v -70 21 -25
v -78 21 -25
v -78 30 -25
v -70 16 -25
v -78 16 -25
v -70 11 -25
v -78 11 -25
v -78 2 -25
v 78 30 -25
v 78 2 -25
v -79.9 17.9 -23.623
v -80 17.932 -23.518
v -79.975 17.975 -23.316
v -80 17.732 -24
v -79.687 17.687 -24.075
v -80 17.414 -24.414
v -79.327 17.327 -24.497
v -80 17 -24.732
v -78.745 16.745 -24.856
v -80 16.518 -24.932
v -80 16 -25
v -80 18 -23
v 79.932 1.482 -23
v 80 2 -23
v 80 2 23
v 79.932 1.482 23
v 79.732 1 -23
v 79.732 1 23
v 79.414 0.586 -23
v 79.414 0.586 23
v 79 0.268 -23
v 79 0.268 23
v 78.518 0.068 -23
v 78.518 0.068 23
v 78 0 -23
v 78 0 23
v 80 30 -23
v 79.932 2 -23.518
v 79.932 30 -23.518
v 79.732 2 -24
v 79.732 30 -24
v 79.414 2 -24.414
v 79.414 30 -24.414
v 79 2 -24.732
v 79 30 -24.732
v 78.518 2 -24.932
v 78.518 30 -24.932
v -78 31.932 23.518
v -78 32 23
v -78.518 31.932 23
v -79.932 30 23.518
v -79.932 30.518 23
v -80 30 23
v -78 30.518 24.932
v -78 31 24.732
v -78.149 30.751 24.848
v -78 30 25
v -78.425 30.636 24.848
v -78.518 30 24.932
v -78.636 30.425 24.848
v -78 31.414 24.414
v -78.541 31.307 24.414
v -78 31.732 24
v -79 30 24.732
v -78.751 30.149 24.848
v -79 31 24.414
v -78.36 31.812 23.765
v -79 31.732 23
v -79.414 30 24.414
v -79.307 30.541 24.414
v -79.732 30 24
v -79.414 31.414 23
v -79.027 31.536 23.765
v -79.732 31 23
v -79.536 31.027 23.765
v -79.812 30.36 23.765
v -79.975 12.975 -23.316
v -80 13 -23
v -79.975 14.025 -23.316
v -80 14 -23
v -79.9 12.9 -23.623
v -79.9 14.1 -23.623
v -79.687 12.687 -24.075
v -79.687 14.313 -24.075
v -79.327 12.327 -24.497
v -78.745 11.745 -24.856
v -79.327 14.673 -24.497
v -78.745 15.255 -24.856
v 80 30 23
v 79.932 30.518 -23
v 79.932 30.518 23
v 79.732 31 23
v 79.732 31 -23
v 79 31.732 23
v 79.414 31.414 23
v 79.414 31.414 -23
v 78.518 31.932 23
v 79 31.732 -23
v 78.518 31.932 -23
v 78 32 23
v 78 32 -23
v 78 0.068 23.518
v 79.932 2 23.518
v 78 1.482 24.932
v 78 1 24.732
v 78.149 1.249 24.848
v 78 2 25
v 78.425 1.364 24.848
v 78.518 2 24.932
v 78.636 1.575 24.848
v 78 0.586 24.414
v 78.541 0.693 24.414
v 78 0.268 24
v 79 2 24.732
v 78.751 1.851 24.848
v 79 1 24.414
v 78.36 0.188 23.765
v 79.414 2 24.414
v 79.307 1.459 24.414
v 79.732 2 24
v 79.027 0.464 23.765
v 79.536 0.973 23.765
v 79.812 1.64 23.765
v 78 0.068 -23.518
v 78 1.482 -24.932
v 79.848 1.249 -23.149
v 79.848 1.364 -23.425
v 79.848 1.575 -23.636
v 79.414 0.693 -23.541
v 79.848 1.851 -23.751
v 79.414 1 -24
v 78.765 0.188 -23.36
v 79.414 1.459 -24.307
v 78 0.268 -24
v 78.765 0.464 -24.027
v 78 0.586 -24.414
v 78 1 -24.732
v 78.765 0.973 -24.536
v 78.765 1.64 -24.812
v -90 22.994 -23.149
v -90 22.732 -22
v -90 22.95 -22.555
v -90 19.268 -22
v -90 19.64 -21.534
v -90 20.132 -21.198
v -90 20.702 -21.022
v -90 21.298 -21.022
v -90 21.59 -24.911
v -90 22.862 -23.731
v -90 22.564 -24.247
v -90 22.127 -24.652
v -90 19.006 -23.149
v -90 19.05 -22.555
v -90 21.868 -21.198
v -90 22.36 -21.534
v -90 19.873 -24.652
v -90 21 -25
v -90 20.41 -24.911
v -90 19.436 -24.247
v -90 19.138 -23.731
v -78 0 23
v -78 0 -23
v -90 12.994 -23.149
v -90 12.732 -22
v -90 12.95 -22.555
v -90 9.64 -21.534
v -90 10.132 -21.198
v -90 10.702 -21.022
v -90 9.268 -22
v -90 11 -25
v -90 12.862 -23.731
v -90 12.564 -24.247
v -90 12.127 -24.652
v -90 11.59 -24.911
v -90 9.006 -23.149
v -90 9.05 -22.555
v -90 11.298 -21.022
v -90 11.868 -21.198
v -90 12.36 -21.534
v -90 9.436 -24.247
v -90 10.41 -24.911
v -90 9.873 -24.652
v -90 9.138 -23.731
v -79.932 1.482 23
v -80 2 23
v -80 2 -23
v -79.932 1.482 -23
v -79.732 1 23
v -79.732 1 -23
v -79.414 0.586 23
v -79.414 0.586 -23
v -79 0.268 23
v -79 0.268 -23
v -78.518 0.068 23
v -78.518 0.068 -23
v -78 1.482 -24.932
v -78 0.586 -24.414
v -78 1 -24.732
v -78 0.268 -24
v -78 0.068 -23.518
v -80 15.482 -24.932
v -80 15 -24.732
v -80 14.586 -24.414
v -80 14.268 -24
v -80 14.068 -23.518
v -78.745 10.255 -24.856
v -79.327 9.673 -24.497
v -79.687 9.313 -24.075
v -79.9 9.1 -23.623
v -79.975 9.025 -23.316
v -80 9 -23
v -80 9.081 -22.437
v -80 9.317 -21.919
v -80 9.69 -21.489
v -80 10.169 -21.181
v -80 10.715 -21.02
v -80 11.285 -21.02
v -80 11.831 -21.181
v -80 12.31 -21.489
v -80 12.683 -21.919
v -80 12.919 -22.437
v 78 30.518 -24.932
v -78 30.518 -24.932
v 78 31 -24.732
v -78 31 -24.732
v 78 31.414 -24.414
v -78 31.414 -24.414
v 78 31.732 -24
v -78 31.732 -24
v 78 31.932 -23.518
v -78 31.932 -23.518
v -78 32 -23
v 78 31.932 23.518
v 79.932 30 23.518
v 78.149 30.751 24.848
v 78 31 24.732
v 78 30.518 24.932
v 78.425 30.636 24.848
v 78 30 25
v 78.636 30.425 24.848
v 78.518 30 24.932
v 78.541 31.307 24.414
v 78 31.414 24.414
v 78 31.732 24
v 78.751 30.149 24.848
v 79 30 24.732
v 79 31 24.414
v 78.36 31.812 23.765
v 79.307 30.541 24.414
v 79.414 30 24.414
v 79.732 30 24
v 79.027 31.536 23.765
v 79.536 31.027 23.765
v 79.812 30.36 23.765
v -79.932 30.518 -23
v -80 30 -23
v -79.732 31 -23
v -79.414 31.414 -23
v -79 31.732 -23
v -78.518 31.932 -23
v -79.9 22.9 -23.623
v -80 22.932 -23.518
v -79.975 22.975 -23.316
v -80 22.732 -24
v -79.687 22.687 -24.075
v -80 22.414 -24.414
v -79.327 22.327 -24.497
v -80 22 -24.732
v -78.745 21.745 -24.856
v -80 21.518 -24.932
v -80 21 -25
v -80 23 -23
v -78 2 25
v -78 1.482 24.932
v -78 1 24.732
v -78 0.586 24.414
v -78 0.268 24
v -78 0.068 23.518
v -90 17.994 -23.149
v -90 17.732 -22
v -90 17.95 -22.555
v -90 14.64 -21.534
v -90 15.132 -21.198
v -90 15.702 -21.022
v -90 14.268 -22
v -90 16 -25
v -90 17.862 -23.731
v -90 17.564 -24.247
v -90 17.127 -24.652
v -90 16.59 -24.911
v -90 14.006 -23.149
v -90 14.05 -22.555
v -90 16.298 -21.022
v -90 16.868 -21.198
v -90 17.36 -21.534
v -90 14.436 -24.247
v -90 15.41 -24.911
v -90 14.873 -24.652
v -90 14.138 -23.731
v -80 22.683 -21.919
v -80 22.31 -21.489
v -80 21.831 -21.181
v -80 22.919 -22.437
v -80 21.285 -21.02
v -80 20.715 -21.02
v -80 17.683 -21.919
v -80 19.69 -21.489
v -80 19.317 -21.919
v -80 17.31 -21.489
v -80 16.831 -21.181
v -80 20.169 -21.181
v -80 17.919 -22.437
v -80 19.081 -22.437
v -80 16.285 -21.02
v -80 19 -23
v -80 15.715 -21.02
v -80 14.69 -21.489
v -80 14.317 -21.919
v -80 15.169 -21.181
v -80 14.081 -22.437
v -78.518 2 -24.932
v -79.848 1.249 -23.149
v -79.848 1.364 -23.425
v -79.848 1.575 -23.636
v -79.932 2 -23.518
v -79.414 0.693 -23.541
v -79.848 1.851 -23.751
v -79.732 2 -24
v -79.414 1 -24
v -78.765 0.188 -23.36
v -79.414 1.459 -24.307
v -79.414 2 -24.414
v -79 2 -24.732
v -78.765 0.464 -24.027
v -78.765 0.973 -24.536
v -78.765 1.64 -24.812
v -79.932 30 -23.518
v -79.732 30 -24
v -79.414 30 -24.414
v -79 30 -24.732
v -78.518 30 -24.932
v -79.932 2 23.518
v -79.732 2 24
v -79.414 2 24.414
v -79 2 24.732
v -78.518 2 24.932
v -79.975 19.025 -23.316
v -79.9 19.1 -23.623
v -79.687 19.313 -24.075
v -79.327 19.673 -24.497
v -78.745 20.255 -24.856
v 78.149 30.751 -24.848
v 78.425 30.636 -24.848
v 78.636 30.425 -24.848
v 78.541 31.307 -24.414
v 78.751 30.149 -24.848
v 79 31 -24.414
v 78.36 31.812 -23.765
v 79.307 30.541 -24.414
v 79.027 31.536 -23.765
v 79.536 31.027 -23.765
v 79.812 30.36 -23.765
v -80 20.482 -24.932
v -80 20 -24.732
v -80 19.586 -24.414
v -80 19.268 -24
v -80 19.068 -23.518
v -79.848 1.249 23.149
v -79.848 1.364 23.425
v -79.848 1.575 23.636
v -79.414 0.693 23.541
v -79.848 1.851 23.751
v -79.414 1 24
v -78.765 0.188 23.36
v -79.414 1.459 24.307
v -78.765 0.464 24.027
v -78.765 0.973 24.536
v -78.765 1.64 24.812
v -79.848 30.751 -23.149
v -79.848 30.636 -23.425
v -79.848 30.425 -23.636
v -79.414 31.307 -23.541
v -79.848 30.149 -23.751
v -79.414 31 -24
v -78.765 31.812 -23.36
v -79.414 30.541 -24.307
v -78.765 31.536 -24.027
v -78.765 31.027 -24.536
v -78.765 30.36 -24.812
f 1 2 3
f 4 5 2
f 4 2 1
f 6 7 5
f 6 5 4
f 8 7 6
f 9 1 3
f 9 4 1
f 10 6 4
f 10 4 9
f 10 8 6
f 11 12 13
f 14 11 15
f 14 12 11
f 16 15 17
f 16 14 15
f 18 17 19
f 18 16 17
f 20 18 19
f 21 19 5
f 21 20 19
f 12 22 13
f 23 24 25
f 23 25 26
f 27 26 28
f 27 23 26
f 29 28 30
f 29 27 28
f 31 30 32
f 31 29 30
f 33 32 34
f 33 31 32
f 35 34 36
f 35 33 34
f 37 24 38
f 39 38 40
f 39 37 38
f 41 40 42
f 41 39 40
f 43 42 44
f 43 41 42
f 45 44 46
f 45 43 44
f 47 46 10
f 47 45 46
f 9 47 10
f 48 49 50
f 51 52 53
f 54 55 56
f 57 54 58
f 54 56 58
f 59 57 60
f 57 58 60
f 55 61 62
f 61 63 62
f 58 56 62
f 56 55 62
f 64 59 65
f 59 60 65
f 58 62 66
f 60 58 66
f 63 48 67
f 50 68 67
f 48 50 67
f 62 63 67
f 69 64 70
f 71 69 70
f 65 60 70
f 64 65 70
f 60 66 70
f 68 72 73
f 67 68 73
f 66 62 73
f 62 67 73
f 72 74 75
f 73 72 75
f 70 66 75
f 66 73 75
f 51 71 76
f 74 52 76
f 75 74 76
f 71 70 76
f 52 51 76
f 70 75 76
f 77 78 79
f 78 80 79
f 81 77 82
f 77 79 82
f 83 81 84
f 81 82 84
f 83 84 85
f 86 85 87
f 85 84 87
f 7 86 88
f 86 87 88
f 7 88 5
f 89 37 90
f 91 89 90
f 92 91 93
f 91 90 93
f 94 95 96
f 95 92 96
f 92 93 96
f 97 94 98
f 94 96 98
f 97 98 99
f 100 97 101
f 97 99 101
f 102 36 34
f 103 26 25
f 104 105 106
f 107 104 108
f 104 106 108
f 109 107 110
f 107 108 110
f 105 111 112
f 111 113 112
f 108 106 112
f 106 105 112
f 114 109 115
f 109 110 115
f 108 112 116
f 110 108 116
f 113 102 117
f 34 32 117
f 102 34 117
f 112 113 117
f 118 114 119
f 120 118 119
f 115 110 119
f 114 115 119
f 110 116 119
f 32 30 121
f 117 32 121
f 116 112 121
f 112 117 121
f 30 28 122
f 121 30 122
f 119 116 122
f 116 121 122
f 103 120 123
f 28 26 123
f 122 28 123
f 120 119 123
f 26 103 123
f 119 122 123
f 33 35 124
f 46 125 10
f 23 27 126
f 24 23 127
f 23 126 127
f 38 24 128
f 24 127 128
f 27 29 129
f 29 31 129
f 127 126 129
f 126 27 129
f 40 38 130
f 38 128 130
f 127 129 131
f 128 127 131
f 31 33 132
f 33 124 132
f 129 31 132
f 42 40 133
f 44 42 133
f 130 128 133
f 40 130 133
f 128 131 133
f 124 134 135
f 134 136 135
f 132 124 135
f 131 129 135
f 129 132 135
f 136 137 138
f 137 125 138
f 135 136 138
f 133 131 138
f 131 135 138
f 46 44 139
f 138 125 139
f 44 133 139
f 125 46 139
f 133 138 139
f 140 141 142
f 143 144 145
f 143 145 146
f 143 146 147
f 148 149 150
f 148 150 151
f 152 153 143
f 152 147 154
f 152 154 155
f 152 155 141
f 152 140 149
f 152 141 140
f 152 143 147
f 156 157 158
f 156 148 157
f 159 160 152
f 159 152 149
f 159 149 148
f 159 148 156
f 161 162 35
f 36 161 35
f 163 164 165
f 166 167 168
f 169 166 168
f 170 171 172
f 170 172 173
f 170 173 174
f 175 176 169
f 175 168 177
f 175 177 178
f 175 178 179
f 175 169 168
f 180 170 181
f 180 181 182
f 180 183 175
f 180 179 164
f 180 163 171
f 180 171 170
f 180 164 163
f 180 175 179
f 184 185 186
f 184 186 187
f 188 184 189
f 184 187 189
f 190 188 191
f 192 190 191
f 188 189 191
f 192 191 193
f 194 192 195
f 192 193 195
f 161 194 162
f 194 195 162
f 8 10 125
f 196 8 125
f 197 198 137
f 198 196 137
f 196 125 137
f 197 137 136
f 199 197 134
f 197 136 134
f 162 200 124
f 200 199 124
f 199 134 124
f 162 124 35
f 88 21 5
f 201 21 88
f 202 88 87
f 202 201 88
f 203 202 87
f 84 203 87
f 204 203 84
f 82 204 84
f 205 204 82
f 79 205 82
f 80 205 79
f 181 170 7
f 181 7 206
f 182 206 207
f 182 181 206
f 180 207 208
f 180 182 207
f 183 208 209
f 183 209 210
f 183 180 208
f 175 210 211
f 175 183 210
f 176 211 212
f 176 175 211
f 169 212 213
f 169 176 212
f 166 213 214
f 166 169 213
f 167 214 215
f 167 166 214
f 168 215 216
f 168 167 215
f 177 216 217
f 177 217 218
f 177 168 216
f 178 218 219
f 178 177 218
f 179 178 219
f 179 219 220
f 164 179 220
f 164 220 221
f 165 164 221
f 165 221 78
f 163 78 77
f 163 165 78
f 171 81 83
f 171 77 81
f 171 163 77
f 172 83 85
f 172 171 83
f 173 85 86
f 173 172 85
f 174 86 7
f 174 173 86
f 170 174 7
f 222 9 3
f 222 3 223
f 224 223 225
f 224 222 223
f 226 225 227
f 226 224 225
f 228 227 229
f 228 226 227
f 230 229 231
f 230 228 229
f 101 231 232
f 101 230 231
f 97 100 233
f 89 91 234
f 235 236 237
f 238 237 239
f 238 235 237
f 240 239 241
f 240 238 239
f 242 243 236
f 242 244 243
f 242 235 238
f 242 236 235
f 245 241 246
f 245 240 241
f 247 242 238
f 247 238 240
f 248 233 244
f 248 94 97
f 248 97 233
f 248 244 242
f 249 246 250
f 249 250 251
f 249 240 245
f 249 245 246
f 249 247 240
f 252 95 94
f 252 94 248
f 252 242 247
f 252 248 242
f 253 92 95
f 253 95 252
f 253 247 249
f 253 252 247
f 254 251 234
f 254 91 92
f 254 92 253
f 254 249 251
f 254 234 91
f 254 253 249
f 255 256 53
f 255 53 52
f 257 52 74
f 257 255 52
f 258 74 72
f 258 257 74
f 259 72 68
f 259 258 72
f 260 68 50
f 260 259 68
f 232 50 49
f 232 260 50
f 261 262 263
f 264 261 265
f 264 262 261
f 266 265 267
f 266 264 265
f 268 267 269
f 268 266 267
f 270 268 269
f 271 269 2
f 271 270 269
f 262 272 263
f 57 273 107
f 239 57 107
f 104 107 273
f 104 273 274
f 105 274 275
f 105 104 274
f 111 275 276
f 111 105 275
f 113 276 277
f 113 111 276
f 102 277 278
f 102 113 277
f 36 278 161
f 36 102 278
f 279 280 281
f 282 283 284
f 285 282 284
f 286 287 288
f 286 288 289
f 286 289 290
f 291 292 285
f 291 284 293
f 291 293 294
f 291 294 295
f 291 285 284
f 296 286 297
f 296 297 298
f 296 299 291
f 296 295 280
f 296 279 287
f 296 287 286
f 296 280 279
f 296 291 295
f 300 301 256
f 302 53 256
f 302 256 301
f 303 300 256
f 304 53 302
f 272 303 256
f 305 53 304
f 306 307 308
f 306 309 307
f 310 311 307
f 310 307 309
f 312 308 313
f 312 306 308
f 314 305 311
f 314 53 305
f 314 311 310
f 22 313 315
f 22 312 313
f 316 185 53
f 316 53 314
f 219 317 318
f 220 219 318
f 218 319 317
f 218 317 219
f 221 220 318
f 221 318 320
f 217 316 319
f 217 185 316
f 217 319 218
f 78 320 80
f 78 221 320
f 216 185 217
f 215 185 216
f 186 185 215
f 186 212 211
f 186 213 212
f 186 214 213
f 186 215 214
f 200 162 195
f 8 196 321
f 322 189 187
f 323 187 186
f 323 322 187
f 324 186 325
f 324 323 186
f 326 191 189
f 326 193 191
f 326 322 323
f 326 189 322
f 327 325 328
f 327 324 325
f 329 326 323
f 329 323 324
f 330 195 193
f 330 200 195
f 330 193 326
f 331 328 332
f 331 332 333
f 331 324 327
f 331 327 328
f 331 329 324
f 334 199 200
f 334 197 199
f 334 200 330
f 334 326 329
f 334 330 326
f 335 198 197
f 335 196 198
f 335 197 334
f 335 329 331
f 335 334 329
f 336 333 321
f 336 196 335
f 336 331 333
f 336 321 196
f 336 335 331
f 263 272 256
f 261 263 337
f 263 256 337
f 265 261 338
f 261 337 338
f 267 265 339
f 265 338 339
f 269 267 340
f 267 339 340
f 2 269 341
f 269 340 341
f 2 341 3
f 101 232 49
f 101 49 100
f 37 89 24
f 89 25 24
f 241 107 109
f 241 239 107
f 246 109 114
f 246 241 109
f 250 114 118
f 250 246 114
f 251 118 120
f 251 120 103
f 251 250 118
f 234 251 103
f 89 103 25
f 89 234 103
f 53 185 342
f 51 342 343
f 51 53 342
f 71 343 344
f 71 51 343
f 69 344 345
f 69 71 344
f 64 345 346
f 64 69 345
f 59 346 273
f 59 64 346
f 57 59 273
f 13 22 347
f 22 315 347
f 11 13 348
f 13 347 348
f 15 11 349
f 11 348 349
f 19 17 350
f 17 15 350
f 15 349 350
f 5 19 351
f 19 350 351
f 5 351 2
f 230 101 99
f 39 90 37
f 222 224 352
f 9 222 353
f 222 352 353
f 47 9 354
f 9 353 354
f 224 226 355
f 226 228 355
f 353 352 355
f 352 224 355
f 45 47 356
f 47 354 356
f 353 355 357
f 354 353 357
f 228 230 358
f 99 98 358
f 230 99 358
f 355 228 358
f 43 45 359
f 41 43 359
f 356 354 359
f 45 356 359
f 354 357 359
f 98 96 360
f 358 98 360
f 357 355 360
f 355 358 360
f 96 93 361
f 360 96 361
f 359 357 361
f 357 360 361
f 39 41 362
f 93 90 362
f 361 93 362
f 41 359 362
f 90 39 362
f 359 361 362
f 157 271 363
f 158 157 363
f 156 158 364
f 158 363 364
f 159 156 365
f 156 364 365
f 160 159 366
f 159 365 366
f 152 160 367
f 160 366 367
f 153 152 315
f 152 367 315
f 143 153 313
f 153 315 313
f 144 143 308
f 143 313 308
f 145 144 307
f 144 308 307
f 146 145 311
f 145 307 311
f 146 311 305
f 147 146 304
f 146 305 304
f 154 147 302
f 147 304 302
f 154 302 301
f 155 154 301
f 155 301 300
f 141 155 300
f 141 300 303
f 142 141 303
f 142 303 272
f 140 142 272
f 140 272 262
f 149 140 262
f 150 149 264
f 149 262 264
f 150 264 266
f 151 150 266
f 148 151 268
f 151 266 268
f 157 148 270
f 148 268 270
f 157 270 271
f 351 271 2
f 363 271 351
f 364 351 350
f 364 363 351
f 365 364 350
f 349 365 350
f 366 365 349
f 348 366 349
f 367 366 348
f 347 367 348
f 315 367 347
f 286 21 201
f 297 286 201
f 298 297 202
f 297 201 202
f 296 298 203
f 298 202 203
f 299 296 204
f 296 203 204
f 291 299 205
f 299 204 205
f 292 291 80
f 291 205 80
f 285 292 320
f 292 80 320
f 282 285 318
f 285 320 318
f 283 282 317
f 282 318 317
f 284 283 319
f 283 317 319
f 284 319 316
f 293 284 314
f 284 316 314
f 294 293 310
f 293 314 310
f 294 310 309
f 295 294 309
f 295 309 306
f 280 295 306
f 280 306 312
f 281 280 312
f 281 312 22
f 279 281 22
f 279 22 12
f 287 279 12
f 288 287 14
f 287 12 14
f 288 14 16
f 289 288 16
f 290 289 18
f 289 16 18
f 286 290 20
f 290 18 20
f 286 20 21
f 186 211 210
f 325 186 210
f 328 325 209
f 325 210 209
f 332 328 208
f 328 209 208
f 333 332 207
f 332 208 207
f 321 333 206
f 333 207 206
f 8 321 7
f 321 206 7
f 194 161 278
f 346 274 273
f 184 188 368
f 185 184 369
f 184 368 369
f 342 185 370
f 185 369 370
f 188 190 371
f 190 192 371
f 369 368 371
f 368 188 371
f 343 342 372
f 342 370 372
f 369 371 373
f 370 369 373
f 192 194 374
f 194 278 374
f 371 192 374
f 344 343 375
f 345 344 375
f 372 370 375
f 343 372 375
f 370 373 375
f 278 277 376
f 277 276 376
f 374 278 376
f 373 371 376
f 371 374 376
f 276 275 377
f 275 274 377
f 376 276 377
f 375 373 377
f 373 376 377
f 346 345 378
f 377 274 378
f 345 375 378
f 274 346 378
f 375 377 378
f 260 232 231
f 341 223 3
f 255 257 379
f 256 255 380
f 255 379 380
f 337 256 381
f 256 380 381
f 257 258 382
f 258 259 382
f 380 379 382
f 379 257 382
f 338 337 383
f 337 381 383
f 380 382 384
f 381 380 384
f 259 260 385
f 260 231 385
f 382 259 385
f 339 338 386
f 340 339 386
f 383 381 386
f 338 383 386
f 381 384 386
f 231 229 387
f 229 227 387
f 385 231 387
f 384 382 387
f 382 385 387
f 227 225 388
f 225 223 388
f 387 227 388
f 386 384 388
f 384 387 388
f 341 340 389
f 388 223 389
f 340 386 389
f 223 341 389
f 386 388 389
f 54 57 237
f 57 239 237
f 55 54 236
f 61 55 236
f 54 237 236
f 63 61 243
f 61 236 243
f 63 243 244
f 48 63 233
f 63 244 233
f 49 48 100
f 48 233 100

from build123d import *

# Parameters (mm, degrees)
SKETCH1_W           = 160
SKETCH1_H           = 50
BOSS_EXTRUDE1_DEPTH = 32
FILLET1_R           = 2
SKETCH2_R           = 2
BOSS_EXTRUDE2_DEPTH = 10


with BuildPart() as part:
    # Sketch1 → Boss-Extrude1 (new body)
    with BuildSketch(Plane(origin=(0, 0, 0), x_dir=(1, 0, 0), z_dir=(0, 1, 0))):
        Rectangle(SKETCH1_W, SKETCH1_H)
    extrude(amount=BOSS_EXTRUDE1_DEPTH)

    # Fillet1
    fillet1_edges = [part.edges().sort_by_distance(p)[0] for p in [
        (80, 32, 0),
        (0, 32, -25),
        (-80, 32, 0),
        (0, 0, -25),
        (80, 0, 0),
        (0, 0, 25),
        (-80, 0, 0),
        (0, 32, 25),
        (-80, 16, -25),
        (80, 16, -25),
        (80, 16, 25),
        (-80, 16, 25),
    ]]
    fillet(fillet1_edges, radius=FILLET1_R)

    # Sketch2 → Boss-Extrude2 (add, symmetric)
    with BuildSketch(Plane.ZY.offset(80)):
        with Locations(Location((-23, 21, 0), (0, 0, 180))):
            Circle(SKETCH2_R)
        with Locations(Location((-23, 16, 0), (0, 0, 180))):
            Circle(SKETCH2_R)
        with Locations(Location((-23, 11, 0), (0, 0, 180))):
            Circle(SKETCH2_R)
    extrude(amount=BOSS_EXTRUDE2_DEPTH, both=True)


solid = part.part
